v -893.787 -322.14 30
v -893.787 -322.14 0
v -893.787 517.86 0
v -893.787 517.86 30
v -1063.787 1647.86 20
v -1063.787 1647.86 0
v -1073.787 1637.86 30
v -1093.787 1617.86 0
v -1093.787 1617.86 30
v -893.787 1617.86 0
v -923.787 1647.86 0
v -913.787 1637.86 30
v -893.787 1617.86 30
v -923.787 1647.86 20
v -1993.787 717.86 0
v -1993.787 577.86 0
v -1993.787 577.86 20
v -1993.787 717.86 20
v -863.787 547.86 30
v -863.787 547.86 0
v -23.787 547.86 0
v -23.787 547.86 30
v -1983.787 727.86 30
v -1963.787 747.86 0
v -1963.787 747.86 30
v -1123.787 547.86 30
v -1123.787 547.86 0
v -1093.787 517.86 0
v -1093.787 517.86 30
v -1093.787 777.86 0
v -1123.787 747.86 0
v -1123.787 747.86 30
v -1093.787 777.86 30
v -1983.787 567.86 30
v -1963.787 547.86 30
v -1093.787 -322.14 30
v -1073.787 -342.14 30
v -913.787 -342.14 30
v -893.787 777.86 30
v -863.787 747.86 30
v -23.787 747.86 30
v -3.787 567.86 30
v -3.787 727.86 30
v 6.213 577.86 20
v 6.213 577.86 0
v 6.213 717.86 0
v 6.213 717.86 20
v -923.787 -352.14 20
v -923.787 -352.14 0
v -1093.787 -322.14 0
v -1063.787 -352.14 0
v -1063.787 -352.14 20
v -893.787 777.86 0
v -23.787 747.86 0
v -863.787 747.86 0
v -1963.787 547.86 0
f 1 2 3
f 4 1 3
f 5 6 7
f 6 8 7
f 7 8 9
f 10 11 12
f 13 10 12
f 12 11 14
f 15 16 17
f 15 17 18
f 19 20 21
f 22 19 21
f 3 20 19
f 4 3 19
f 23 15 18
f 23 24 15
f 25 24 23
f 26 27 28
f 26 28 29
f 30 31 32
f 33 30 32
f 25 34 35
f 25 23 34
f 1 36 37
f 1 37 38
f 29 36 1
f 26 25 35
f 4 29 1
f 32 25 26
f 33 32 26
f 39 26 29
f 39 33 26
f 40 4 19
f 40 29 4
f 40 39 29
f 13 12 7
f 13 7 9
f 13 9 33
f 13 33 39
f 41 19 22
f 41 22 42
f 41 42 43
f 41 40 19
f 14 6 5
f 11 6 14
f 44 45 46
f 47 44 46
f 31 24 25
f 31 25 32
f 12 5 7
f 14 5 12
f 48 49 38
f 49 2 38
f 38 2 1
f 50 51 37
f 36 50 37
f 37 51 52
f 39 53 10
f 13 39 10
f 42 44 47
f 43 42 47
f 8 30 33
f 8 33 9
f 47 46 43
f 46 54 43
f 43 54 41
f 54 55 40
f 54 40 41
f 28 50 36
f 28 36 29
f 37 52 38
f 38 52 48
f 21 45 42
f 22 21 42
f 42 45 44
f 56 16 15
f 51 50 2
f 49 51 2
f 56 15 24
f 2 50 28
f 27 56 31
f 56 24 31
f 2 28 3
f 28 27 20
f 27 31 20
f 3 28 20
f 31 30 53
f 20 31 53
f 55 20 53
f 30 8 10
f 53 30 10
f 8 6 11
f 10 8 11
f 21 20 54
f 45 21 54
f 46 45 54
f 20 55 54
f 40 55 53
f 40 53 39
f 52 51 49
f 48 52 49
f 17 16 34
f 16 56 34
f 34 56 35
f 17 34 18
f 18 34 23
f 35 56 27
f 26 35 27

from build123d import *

# Parameters (mm, degrees)
F0_W     = 900
F0_H     = 200
F0_W_2   = 200
F0_H_2   = 900
F1_DEPTH = 30
F2_SIZE  = 30
F3_SIZE  = 10


with BuildPart() as f1:
    # F0 (on Top) → F1 (new body)
    with BuildSketch(Plane.XY):
        with Locations((-1543.7867450795, 647.8599071422)):
            Rectangle(F0_W, F0_H)
        with Locations((-993.7867450795, 1197.8599071422)):
            Rectangle(F0_W_2, F0_H_2)
        with Locations((-993.7867450795, 647.8599071422)):
            Rectangle(F0_W_2, F0_H)
        with Locations((-443.7867450795, 647.8599071422)):
            Rectangle(F0_W, F0_H)
        with Locations((-993.7867450795, 97.8599071422)):
            Rectangle(F0_W_2, F0_H_2)
    extrude(amount=F1_DEPTH)

    # F2
    f2_edges = [f1.edges().sort_by_distance(p)[0] for p in [
        (-1093.786745, 747.859907, 15),
        (-1993.786745, 747.859907, 15),
        (-1993.786745, 547.859907, 15),
        (-1093.786745, 547.859907, 15),
        (-1093.786745, -352.140093, 15),
        (-893.786745, -352.140093, 15),
        (-893.786745, 547.859907, 15),
        (6.213255, 547.859907, 15),
        (6.213255, 747.859907, 15),
        (-893.786745, 747.859907, 15),
        (-893.786745, 1647.859907, 15),
        (-1093.786745, 1647.859907, 15),
    ]]
    chamfer(f2_edges, length=F2_SIZE)

    # F3
    f3_edges = [f1.edges().sort_by_distance(p)[0] for p in [
        (-993.786745, -352.140093, 30),
        (6.213255, 647.859907, 30),
        (-993.786745, 1647.859907, 30),
        (-1993.786745, 647.859907, 30),
    ]]
    chamfer(f3_edges, length=F3_SIZE)


solid = f1.part
